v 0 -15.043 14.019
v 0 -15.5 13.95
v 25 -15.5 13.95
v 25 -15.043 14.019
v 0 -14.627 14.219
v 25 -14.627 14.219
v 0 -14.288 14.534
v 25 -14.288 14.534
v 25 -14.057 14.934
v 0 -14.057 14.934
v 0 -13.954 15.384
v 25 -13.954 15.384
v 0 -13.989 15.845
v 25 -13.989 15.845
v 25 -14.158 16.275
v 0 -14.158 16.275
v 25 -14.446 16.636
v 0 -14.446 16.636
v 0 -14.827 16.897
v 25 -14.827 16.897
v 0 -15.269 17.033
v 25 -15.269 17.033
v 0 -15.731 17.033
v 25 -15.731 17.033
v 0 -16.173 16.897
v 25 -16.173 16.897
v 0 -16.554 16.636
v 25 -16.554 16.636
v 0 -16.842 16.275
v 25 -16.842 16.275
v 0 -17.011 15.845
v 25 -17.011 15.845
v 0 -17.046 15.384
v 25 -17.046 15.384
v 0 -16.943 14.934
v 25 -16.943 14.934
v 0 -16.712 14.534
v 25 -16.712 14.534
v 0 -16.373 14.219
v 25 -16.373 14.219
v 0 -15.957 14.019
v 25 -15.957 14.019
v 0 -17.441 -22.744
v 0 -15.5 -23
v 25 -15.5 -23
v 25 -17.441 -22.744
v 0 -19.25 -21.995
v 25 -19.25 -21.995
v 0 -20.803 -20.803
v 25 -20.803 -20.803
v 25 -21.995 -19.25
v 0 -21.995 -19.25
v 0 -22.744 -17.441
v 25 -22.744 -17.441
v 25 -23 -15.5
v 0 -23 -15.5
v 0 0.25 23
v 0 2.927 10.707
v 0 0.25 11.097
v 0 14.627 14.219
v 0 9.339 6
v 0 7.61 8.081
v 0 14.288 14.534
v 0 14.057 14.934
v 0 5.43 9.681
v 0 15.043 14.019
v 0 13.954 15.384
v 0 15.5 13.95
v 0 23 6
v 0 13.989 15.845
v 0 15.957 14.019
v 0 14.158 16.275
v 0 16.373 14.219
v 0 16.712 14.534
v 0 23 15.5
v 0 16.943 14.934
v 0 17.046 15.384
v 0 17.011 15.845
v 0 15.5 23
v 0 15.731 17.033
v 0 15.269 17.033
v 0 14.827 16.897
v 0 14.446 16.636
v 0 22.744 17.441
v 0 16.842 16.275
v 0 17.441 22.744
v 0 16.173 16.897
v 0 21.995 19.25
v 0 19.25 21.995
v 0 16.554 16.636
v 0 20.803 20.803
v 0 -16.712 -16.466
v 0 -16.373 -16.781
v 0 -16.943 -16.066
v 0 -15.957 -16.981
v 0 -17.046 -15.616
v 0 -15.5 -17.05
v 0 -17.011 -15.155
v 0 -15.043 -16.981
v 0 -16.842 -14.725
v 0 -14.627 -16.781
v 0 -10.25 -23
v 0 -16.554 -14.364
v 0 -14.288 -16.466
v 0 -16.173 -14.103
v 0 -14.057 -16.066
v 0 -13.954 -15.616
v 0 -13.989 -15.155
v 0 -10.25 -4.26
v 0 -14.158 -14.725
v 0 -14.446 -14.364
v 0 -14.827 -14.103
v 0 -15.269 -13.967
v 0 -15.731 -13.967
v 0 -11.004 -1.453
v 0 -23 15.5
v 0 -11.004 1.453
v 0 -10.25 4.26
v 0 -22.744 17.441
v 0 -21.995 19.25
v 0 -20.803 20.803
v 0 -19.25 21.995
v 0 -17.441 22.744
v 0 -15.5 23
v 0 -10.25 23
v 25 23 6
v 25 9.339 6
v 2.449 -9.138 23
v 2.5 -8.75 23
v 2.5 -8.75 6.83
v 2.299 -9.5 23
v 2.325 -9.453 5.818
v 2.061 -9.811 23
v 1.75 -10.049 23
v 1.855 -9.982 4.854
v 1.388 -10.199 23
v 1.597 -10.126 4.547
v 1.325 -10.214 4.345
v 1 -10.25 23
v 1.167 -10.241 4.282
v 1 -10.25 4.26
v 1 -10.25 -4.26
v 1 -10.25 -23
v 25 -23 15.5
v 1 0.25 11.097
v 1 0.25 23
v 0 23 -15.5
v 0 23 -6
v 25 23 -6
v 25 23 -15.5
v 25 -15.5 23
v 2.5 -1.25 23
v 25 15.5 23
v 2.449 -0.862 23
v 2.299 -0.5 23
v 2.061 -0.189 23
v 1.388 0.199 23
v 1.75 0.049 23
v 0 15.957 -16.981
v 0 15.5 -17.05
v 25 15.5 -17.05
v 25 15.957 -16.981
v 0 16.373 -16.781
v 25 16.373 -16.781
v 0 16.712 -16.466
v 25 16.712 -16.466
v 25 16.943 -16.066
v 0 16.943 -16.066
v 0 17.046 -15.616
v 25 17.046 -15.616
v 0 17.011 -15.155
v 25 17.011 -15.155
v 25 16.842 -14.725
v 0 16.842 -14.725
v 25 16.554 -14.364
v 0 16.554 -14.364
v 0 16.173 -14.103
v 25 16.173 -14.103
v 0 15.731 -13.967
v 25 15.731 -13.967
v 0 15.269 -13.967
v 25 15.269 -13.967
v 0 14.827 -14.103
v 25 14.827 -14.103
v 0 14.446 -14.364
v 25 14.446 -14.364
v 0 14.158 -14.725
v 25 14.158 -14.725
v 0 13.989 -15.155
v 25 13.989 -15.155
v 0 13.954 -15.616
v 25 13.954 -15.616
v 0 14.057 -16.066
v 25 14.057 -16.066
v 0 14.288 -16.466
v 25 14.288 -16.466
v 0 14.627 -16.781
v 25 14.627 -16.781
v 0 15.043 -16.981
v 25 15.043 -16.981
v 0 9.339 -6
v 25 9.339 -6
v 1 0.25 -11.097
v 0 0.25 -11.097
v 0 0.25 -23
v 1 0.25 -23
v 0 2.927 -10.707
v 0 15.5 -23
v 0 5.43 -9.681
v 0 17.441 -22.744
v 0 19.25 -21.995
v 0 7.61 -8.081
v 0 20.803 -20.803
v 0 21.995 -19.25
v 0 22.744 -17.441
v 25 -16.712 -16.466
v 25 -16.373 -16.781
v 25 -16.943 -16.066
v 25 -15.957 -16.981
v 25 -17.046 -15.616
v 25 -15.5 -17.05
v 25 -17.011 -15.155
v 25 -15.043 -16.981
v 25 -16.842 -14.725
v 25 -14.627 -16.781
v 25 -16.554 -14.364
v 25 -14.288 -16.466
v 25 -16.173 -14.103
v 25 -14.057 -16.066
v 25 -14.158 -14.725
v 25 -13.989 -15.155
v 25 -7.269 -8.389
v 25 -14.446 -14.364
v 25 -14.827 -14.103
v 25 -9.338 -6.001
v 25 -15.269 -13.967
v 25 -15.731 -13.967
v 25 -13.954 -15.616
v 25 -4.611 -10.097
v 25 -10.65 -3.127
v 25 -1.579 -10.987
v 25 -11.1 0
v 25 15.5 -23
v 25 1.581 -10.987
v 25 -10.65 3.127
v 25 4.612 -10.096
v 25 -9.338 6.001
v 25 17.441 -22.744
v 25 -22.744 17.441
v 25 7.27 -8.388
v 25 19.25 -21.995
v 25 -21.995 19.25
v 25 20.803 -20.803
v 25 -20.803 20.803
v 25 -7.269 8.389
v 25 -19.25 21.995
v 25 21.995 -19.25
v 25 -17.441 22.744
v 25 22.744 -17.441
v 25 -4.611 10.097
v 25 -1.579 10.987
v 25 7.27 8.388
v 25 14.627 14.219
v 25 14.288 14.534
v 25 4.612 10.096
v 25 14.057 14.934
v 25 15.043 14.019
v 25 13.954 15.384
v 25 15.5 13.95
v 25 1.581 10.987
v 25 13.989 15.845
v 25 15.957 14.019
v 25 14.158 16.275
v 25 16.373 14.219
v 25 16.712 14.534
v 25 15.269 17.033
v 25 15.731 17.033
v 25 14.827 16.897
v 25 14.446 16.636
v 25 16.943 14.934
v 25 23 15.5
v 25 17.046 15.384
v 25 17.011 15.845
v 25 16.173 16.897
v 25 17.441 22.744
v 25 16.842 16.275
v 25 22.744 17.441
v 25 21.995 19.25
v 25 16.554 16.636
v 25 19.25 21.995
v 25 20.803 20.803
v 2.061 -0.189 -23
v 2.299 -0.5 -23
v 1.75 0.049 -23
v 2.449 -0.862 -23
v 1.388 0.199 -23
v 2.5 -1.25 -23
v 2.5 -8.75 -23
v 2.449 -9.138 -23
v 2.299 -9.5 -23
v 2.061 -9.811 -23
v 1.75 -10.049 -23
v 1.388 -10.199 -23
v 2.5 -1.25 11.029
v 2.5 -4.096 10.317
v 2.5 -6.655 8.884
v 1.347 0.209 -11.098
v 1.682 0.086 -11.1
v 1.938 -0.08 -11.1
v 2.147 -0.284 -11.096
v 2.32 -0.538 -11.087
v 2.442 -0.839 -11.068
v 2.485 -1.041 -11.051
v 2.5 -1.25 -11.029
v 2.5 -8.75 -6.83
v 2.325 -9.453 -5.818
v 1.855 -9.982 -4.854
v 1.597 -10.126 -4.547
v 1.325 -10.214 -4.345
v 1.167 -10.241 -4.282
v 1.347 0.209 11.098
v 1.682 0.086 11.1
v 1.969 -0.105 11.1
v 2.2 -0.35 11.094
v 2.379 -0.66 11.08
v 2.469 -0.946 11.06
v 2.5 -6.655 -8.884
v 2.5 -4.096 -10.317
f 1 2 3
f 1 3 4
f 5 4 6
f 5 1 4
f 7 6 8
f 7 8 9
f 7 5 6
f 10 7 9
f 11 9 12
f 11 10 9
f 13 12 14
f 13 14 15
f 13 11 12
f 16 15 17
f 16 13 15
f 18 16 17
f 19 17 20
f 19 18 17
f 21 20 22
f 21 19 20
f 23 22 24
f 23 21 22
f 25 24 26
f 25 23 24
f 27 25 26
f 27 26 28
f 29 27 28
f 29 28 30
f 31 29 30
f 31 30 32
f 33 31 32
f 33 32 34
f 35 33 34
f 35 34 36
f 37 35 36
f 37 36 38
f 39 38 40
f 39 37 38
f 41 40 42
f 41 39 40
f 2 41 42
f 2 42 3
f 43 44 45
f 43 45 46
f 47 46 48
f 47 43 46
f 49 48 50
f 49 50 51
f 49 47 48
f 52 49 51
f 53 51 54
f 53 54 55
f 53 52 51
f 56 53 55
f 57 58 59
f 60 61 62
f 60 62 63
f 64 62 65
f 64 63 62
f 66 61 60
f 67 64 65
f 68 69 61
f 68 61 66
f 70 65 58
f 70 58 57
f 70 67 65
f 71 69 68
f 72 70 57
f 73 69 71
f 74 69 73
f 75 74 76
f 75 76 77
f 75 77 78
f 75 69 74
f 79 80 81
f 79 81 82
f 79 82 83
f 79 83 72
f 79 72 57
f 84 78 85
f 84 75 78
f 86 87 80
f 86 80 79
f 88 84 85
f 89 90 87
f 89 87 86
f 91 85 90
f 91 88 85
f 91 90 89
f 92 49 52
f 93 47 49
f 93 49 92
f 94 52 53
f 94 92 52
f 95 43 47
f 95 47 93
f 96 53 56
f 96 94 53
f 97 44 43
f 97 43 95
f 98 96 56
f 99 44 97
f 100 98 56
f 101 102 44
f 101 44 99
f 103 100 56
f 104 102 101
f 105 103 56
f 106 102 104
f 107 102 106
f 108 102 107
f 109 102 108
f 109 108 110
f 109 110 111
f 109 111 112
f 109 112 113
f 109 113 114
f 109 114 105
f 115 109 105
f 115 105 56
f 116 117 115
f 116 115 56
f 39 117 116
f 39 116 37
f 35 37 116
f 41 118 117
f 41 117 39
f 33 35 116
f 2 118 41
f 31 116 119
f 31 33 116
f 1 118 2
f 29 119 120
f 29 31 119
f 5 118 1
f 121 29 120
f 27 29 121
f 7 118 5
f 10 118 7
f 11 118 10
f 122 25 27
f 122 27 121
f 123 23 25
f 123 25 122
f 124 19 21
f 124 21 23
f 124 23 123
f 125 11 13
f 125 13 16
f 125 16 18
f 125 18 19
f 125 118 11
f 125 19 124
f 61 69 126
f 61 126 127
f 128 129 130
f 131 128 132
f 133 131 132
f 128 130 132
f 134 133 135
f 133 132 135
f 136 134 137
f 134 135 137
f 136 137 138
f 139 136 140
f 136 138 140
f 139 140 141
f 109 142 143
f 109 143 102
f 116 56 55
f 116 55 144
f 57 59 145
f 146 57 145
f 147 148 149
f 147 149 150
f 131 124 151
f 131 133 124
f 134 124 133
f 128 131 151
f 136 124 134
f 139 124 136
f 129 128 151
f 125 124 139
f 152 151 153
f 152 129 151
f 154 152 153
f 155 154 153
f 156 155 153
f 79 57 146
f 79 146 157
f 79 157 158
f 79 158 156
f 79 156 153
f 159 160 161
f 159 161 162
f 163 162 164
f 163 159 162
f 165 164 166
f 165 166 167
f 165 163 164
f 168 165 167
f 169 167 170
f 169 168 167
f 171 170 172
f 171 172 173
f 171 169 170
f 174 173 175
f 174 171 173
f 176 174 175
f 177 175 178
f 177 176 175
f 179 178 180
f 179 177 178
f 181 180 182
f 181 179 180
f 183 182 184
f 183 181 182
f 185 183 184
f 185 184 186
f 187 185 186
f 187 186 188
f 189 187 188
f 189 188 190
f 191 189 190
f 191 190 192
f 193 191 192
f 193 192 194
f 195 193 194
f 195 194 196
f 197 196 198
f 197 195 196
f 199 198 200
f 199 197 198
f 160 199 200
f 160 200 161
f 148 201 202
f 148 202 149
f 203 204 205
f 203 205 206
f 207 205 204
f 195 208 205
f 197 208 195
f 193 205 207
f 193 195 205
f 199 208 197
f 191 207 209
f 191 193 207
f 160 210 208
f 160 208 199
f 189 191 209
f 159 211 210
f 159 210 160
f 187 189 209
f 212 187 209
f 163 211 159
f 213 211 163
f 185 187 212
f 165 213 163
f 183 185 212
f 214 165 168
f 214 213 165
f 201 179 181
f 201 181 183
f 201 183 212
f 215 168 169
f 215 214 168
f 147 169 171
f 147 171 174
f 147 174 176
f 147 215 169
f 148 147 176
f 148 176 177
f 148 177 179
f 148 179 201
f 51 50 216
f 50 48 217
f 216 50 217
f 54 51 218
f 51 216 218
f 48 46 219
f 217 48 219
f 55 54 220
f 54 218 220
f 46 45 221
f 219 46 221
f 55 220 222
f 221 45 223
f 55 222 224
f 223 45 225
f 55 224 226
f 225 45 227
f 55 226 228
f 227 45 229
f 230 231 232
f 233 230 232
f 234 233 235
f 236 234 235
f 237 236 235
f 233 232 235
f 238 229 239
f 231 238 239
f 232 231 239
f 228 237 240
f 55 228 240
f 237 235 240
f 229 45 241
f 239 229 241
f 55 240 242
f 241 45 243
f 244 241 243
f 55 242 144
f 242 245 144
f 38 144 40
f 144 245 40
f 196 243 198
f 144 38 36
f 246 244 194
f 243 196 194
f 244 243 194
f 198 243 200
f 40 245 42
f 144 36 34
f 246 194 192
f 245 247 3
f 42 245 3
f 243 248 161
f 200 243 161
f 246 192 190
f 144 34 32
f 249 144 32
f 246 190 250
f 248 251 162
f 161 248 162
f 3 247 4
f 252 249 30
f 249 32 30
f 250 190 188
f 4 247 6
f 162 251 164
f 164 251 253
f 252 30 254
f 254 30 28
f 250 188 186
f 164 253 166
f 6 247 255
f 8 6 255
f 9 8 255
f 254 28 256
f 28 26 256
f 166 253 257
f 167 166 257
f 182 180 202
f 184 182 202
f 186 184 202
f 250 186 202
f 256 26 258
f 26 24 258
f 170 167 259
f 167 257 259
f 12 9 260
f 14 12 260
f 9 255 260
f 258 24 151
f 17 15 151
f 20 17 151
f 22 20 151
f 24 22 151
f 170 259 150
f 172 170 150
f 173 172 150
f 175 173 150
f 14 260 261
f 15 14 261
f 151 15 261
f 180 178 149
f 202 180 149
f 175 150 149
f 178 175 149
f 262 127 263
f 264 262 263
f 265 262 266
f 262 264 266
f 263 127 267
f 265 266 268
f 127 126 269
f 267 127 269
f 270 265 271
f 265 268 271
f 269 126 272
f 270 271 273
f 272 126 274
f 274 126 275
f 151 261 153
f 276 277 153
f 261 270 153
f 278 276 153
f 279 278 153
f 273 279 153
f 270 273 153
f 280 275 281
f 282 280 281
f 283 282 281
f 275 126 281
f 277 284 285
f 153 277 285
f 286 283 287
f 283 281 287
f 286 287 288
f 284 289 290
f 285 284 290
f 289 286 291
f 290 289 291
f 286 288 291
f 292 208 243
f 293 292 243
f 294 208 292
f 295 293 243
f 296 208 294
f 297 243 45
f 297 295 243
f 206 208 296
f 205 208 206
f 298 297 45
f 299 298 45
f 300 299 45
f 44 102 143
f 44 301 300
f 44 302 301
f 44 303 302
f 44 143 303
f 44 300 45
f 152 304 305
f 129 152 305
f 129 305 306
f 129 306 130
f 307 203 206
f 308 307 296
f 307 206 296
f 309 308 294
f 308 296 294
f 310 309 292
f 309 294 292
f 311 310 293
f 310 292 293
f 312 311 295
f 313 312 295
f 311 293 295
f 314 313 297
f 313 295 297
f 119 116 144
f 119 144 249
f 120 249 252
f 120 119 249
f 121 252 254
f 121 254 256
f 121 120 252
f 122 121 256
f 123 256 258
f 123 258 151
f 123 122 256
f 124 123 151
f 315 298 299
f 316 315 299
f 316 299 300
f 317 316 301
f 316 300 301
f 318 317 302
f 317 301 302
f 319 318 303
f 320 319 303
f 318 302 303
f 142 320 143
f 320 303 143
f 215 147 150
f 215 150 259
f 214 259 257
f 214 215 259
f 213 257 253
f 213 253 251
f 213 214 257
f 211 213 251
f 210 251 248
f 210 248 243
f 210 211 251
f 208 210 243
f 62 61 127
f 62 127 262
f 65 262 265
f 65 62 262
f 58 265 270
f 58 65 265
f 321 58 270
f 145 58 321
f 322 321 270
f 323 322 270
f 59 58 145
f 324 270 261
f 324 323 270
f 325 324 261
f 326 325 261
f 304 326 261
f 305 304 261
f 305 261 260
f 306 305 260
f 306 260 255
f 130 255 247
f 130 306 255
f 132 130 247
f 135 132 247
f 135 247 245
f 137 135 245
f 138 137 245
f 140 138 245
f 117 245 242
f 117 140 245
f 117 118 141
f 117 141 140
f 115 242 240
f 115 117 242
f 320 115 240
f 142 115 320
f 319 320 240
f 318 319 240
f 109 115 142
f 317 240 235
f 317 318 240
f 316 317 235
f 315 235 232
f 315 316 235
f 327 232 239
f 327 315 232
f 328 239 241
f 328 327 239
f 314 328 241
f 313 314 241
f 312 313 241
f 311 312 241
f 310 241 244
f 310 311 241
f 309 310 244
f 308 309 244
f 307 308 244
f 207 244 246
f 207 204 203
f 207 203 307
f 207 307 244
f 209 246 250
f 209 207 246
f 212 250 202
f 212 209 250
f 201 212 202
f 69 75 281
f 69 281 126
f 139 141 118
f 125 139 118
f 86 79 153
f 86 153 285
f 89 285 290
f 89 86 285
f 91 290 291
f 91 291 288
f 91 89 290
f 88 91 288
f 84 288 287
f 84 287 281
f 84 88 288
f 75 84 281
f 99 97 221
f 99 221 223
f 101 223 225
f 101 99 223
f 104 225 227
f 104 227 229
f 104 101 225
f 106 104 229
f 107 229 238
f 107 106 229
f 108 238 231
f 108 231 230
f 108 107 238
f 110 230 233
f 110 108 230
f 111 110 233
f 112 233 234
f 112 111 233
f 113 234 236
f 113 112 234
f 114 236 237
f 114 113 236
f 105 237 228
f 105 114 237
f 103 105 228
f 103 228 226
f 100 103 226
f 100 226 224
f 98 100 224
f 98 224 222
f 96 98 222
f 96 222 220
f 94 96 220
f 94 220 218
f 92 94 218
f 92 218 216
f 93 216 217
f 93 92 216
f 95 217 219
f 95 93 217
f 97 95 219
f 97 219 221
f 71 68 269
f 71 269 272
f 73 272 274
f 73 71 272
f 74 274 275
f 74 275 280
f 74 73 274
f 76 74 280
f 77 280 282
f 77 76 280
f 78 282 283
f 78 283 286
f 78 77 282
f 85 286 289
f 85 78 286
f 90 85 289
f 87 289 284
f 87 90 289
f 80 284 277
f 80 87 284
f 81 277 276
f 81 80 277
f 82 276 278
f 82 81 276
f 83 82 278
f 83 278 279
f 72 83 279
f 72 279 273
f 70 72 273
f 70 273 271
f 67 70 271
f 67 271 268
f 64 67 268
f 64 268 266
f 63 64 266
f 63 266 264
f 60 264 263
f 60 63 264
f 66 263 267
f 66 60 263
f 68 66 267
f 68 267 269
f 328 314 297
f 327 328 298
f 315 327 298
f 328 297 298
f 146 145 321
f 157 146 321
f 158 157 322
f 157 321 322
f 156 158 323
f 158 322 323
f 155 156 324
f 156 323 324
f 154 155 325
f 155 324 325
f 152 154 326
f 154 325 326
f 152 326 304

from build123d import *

# Parameters (mm, degrees)
CROQUIS1_R              = 11.1
CROQUIS1_R_2            = 1.55
SALIENTE_EXTRUIR1_DEPTH = 25
CORTAR_EXTRUIR1_DEPTH   = 42.024382994
CORTAR_EXTRUIR2_DEPTH   = 58.183913822


with BuildPart() as part:
    # Croquis1 → Saliente-Extruir1 (new body)
    with BuildSketch(Plane(origin=(0, 0, 0), x_dir=(0, 0, -1), z_dir=(1, 0, 0))):
        with BuildLine():
            Line((-15.5, 23), (15.5, 23))
            ThreePointArc((15.5, 23), (20.803300859, 20.803300859), (23, 15.5))
            Line((23, 15.5), (23, -15.5))
            ThreePointArc((23, -15.5), (20.803300859, -20.803300859), (15.5, -23))
            Line((15.5, -23), (-15.5, -23))
            ThreePointArc((-15.5, -23), (-20.803300859, -20.803300859), (-23, -15.5))
            Line((-23, -15.5), (-23, 15.5))
            ThreePointArc((-23, 15.5), (-20.803300859, 20.803300859), (-15.5, 23))
        make_face()
        Circle(CROQUIS1_R, mode=Mode.SUBTRACT)
        with Locations((-15.5, 15.5)):
            Circle(CROQUIS1_R_2, mode=Mode.SUBTRACT)
        with Locations((15.5, 15.5)):
            Circle(CROQUIS1_R_2, mode=Mode.SUBTRACT)
        with Locations((15.5, -15.5)):
            Circle(CROQUIS1_R_2, mode=Mode.SUBTRACT)
        with Locations((-15.5, -15.5)):
            Circle(CROQUIS1_R_2, mode=Mode.SUBTRACT)
    extrude(amount=SALIENTE_EXTRUIR1_DEPTH)

    # Croquis2 → Cortar-Extruir1 (cut, through all)
    with BuildSketch(Plane(origin=(25, 0, 0), x_dir=(0, 0, -1), z_dir=(1, 0, 0))):
        with BuildLine():
            Line((-6, 23), (-6, 9.33862945))
            ThreePointArc((-6, 9.33862945), (0, 11.1), (6, 9.33862945))
            Line((6, 9.33862945), (6, 23))
            Line((6, 23), (-6, 23))
        make_face()
    extrude(amount=-CORTAR_EXTRUIR1_DEPTH, mode=Mode.SUBTRACT)

    # Croquis3 → Cortar-Extruir2 (cut, through all)
    with BuildSketch(Plane(origin=(0, 0, -23), x_dir=(-1, 0, 0), z_dir=(0, 0, -1))):
        with BuildLine():
            Line((0, 0.25), (-1, 0.25))
            ThreePointArc((-1, 0.25), (-2.060660172, -0.189339828), (-2.5, -1.25))
            Line((-2.5, -1.25), (-2.5, -8.75))
            ThreePointArc((-2.5, -8.75), (-2.060660172, -9.810660172), (-1, -10.25))
            Line((-1, -10.25), (0, -10.25))
            Line((0, -10.25), (0, 0.25))
        make_face()
    extrude(amount=-CORTAR_EXTRUIR2_DEPTH, mode=Mode.SUBTRACT)


solid = part.part
